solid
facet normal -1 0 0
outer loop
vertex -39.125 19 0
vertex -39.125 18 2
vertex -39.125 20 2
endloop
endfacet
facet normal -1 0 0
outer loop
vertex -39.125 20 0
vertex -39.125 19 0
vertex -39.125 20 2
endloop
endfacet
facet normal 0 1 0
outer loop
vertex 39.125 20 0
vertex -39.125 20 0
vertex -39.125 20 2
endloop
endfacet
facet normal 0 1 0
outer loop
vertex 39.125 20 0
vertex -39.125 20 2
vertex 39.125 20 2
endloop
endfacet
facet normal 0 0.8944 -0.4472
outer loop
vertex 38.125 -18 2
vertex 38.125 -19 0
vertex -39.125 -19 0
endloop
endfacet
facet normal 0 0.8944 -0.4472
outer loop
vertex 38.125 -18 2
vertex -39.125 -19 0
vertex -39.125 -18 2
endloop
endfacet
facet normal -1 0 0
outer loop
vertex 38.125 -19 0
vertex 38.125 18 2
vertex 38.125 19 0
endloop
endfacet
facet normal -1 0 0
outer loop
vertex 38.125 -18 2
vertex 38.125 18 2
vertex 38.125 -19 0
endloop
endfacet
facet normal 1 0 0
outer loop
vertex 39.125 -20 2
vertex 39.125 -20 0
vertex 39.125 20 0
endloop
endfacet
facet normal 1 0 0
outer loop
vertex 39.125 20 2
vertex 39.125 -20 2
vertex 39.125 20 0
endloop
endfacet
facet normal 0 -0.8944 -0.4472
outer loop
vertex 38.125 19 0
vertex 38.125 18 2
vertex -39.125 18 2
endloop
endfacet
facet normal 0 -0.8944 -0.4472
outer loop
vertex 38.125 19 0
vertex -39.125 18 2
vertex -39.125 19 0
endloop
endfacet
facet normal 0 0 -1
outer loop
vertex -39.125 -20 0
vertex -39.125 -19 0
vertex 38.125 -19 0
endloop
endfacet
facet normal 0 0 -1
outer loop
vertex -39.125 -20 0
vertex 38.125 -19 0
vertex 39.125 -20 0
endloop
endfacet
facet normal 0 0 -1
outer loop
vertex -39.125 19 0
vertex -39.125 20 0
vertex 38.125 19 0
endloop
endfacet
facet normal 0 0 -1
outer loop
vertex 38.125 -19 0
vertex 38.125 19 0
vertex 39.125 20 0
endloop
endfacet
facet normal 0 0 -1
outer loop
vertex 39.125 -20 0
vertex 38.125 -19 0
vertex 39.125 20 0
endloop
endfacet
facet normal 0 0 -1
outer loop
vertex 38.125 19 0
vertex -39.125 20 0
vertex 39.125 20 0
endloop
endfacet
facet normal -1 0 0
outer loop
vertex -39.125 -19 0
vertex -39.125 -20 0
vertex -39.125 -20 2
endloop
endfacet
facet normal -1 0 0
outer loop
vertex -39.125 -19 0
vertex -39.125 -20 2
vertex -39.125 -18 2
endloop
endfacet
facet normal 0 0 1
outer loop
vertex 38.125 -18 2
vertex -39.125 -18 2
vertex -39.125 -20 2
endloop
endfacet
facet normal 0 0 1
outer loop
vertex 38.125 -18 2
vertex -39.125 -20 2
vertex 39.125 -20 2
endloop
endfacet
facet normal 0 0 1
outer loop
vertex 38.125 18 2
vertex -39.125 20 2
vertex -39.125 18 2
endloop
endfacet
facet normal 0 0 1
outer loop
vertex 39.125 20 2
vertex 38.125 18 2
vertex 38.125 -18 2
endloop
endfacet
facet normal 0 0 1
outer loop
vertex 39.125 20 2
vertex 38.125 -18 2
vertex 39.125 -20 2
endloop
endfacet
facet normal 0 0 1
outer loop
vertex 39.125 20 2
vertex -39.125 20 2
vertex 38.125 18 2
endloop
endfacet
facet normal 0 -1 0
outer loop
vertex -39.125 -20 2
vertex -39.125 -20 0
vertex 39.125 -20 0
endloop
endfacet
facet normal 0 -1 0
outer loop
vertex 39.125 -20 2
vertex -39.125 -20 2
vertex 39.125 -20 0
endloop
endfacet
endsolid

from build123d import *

# Parameters (mm, degrees)
F0_W     = 78.25
F0_H     = 40
F1_DEPTH = 2
F3_DEPTH = 77.25


with BuildPart() as f1:
    # F0 (on Top) → F1 (new body)
    with BuildSketch(Plane.XY):
        Rectangle(F0_W, F0_H)
    extrude(amount=F1_DEPTH)

    # F2 (on face) → F3 (cut)
    with BuildSketch(Plane(origin=(-39.125, 0, 0), x_dir=(0, -1, 0), z_dir=(-1, 0, 0))):
        Polygon((18, 2), (-18, 2), (-19, 0), (19, 0), align=None)
    extrude(amount=-F3_DEPTH, mode=Mode.SUBTRACT)


solid = f1.part
